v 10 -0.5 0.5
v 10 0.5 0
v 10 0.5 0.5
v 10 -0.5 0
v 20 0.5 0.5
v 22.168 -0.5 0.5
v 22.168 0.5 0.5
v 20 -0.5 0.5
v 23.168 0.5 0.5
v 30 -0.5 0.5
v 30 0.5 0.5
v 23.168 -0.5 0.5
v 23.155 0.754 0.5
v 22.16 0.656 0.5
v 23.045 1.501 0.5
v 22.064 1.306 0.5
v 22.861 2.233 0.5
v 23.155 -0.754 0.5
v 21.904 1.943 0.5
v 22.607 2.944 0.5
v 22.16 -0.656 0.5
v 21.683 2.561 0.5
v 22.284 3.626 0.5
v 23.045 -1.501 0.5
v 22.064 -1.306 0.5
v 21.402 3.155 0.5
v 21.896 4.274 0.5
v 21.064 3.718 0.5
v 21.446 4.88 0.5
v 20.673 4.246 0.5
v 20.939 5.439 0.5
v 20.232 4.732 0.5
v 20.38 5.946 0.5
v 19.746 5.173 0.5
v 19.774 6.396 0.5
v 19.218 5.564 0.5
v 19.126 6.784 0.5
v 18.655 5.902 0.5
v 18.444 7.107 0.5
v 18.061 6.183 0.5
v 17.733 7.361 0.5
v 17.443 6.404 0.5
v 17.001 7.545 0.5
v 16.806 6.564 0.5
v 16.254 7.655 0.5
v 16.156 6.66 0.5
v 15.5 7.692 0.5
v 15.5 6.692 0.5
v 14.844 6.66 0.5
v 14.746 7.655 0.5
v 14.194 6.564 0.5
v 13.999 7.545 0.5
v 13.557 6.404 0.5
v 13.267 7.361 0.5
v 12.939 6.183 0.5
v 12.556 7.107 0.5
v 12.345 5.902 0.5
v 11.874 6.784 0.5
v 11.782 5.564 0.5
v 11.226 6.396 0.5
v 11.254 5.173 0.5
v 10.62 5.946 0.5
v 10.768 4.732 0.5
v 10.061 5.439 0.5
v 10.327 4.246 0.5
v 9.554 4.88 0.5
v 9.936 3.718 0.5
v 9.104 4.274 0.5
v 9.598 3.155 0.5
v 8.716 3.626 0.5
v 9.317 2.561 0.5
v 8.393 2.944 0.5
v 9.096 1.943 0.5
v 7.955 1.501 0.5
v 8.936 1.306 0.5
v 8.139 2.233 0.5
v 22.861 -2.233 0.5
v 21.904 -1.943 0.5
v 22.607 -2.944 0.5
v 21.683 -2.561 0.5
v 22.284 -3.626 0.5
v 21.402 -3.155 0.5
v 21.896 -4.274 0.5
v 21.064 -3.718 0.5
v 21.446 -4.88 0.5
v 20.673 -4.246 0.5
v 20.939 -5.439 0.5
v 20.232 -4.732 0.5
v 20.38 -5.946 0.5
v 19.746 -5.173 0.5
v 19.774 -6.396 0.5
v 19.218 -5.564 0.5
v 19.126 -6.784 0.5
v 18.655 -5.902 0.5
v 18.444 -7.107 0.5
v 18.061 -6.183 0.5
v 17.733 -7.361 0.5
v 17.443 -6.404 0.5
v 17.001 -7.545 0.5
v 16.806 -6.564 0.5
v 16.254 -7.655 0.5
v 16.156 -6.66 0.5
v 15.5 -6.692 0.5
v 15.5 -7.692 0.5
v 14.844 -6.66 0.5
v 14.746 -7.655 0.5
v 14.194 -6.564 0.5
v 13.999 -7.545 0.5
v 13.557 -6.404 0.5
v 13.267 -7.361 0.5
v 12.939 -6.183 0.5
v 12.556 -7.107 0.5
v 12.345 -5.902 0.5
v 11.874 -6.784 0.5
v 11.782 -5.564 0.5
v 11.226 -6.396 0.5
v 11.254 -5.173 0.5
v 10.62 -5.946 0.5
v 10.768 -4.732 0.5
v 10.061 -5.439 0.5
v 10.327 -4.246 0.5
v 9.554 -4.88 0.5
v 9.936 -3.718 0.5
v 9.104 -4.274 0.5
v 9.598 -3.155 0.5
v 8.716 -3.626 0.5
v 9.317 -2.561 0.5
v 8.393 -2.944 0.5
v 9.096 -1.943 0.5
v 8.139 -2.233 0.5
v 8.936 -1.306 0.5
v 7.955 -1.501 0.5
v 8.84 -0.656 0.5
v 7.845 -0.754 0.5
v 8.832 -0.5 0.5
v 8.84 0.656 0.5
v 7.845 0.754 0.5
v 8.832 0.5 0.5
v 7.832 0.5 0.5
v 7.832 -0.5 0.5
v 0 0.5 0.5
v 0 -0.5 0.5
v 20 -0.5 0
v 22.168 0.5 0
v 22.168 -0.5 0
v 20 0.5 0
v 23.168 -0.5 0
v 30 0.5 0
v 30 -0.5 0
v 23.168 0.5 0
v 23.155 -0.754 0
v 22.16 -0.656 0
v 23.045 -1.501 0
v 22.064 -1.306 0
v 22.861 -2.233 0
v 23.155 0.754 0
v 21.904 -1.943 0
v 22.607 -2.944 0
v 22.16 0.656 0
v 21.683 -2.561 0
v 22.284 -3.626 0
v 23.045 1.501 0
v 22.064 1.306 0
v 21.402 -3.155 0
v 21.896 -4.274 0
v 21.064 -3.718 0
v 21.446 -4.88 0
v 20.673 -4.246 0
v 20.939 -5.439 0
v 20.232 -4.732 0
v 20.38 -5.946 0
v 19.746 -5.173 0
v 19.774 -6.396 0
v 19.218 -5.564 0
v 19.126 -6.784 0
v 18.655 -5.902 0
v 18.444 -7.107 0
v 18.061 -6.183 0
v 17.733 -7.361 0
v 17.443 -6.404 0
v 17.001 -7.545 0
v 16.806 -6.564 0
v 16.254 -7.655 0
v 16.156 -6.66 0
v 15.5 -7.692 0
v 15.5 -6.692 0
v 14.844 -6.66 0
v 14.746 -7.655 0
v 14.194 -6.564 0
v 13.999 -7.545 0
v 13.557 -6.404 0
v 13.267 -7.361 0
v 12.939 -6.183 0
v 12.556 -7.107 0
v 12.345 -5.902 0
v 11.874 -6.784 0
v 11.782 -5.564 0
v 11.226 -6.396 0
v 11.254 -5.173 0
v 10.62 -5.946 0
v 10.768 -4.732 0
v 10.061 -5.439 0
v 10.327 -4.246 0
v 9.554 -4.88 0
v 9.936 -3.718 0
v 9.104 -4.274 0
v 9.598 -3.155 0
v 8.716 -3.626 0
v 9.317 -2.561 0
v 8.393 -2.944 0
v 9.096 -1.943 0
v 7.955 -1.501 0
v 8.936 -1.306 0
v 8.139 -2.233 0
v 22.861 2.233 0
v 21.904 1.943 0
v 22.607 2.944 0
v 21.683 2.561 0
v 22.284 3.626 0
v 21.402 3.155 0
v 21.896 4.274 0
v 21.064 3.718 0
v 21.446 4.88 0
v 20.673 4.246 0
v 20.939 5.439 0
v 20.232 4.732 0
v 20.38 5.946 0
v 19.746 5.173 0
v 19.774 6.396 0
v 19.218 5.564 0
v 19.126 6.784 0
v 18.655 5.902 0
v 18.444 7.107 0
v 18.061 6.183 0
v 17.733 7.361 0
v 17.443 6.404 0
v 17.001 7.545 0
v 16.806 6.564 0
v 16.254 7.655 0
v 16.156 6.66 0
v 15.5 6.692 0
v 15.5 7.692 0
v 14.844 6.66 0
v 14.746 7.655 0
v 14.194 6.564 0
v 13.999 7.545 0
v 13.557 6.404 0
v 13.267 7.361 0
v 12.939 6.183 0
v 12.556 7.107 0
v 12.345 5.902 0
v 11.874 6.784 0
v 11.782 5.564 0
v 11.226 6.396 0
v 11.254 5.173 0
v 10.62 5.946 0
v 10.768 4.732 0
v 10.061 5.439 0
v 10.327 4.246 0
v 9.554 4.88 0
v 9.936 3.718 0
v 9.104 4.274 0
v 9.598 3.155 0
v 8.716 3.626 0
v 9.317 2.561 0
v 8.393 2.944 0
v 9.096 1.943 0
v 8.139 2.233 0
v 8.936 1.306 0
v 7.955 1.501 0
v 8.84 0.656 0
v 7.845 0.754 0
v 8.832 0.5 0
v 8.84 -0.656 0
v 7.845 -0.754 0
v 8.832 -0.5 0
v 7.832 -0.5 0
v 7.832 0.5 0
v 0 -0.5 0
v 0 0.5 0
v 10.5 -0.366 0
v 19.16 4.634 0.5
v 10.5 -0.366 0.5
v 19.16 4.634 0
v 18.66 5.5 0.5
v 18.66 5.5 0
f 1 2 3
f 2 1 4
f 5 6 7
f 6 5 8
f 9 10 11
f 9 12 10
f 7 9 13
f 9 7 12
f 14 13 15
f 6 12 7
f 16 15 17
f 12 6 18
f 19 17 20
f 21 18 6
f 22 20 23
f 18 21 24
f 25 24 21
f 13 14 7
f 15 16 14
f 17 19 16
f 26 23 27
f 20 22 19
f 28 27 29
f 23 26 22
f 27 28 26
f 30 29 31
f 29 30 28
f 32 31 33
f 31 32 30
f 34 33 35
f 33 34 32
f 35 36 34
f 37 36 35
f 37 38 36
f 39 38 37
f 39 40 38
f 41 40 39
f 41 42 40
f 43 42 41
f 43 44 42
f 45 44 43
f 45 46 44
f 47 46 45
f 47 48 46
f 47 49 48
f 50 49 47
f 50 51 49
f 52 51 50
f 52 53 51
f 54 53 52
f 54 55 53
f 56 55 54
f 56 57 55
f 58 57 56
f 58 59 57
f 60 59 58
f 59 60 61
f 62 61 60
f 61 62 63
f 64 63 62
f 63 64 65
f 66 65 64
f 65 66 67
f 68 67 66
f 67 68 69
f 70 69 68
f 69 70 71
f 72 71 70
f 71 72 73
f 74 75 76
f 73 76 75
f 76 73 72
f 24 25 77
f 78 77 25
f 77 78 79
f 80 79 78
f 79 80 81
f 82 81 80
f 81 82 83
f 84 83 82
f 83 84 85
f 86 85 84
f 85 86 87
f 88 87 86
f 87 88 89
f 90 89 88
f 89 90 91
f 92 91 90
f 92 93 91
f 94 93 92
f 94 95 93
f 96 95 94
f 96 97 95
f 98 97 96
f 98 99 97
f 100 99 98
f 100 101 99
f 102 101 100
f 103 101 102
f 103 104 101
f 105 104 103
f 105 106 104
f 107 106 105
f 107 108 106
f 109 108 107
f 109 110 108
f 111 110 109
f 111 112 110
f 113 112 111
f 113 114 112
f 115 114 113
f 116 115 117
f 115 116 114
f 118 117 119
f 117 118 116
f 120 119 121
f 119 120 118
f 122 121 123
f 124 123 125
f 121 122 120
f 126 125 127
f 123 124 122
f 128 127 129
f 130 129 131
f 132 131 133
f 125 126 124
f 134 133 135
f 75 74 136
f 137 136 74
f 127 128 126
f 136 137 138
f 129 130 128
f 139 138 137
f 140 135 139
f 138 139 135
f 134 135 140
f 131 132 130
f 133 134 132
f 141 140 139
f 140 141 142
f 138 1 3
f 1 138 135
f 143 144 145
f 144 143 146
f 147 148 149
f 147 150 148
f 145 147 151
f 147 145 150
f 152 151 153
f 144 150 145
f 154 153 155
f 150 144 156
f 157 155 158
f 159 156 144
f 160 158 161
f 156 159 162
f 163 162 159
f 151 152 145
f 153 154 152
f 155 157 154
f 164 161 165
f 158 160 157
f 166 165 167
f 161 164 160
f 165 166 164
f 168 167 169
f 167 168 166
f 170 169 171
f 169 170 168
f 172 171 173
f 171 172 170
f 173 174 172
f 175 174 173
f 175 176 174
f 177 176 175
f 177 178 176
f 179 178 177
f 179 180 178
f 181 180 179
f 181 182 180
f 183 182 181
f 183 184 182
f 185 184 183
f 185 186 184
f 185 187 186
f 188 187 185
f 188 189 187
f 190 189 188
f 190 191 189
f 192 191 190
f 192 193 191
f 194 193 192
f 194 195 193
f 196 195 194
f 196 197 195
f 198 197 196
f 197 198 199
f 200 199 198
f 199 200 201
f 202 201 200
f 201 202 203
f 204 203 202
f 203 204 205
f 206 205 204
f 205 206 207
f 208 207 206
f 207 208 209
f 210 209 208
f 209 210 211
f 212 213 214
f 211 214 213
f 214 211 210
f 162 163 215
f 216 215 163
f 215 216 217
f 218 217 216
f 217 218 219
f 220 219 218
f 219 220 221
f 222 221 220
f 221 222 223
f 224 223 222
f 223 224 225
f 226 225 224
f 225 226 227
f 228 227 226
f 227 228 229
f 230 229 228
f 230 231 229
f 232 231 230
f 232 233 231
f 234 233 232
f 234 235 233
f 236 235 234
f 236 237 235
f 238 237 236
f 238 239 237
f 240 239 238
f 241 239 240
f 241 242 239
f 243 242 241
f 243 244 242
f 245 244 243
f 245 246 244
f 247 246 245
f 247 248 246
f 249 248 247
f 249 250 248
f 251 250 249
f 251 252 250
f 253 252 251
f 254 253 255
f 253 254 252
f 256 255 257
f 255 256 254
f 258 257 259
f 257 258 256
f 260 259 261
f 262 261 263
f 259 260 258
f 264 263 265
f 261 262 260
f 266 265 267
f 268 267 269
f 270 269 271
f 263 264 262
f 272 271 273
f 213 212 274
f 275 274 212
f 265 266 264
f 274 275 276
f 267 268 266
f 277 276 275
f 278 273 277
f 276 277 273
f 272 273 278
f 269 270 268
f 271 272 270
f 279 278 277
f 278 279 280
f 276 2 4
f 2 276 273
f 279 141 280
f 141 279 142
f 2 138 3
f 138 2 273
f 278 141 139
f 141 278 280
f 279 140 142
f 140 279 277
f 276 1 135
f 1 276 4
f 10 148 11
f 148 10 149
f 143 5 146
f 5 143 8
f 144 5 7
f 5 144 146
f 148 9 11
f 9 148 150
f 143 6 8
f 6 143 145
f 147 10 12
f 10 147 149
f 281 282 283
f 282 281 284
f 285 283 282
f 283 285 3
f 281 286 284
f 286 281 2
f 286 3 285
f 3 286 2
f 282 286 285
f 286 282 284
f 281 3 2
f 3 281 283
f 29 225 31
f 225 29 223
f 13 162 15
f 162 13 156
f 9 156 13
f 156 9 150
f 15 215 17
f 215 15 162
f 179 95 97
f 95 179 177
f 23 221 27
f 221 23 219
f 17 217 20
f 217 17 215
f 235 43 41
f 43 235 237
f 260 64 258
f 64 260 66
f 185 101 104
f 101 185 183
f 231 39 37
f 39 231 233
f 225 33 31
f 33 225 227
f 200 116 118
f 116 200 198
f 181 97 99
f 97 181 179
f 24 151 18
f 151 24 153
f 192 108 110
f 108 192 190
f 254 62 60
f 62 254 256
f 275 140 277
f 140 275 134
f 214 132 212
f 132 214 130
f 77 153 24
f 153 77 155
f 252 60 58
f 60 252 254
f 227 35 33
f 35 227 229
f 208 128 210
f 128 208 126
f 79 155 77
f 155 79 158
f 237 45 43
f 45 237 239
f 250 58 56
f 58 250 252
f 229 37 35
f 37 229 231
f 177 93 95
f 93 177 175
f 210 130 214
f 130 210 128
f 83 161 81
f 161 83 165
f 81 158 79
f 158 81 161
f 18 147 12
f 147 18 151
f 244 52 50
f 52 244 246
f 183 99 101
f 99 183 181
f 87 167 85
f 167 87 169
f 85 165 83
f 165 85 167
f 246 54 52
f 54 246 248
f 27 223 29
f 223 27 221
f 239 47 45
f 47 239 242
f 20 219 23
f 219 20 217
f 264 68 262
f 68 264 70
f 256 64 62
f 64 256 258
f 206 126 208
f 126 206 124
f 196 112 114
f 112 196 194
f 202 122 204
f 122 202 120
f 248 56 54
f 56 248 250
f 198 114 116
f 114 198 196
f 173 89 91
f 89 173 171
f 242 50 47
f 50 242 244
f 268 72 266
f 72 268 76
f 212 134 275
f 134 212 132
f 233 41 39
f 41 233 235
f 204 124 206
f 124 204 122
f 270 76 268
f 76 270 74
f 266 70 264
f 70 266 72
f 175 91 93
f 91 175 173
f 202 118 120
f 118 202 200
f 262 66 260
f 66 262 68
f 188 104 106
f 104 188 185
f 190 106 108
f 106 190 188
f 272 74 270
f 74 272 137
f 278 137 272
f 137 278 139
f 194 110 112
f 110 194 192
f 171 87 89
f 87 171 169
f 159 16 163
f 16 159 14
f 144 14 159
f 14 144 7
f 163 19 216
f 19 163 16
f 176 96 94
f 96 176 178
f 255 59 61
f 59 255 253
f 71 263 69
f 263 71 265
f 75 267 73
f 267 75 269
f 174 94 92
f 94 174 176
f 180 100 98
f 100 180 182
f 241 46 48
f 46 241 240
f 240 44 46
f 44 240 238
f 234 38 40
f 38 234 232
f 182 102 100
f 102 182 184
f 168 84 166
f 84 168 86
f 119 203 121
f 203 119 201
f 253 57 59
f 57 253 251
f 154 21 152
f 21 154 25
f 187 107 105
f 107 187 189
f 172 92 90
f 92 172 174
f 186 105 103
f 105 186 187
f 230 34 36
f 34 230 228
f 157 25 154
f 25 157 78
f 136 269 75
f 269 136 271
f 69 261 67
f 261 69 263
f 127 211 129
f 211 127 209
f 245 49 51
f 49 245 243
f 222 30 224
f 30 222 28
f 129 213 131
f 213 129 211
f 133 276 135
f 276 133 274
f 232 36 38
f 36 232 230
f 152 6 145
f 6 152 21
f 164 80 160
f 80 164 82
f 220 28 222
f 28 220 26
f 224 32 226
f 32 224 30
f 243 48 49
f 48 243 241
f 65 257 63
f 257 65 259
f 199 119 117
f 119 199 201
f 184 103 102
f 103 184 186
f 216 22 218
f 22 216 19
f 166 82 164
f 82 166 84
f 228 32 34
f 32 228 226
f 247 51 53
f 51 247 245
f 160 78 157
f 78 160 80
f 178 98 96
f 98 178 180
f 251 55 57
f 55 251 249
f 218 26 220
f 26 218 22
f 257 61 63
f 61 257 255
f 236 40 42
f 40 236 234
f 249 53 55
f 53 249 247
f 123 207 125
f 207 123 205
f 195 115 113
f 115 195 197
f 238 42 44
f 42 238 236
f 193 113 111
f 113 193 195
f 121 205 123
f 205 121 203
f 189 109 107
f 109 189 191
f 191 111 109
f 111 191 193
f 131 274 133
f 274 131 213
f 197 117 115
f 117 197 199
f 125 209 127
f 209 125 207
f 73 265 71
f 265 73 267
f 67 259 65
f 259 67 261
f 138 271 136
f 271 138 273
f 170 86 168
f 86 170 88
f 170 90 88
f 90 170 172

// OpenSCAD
// file: sym_switch.scad
module switch(length, width, thickness, height)
{
    translate([0,-thickness/2,0])cube([length/2-width/2, thickness, height]);
    translate([(length/2+width/2),-thickness/2,0])cube([(length/2-width/2), thickness, height]);
    
    translate([(length/2-width/2),+thickness/2, 0])rotate([0,0,-60])cube([thickness, width, height]);
    
}

switch(30, 12, 1, 1);
// main file
use <sym_switch.scad>

module switch_reed(length, width, thickness, height)
{
    switch(length, width, thickness, height);
    radius = width/1.3;
    translate([2*length/4+thickness/2,0,0]) difference()
    {
        cylinder(r=radius, h=height, $fn=64);
        translate([0,0,-thickness/2])cylinder(r=(radius-thickness), h=(height+thickness), $fn=64);
    }
}

switch_reed(30, 10, 1, 0.5);
